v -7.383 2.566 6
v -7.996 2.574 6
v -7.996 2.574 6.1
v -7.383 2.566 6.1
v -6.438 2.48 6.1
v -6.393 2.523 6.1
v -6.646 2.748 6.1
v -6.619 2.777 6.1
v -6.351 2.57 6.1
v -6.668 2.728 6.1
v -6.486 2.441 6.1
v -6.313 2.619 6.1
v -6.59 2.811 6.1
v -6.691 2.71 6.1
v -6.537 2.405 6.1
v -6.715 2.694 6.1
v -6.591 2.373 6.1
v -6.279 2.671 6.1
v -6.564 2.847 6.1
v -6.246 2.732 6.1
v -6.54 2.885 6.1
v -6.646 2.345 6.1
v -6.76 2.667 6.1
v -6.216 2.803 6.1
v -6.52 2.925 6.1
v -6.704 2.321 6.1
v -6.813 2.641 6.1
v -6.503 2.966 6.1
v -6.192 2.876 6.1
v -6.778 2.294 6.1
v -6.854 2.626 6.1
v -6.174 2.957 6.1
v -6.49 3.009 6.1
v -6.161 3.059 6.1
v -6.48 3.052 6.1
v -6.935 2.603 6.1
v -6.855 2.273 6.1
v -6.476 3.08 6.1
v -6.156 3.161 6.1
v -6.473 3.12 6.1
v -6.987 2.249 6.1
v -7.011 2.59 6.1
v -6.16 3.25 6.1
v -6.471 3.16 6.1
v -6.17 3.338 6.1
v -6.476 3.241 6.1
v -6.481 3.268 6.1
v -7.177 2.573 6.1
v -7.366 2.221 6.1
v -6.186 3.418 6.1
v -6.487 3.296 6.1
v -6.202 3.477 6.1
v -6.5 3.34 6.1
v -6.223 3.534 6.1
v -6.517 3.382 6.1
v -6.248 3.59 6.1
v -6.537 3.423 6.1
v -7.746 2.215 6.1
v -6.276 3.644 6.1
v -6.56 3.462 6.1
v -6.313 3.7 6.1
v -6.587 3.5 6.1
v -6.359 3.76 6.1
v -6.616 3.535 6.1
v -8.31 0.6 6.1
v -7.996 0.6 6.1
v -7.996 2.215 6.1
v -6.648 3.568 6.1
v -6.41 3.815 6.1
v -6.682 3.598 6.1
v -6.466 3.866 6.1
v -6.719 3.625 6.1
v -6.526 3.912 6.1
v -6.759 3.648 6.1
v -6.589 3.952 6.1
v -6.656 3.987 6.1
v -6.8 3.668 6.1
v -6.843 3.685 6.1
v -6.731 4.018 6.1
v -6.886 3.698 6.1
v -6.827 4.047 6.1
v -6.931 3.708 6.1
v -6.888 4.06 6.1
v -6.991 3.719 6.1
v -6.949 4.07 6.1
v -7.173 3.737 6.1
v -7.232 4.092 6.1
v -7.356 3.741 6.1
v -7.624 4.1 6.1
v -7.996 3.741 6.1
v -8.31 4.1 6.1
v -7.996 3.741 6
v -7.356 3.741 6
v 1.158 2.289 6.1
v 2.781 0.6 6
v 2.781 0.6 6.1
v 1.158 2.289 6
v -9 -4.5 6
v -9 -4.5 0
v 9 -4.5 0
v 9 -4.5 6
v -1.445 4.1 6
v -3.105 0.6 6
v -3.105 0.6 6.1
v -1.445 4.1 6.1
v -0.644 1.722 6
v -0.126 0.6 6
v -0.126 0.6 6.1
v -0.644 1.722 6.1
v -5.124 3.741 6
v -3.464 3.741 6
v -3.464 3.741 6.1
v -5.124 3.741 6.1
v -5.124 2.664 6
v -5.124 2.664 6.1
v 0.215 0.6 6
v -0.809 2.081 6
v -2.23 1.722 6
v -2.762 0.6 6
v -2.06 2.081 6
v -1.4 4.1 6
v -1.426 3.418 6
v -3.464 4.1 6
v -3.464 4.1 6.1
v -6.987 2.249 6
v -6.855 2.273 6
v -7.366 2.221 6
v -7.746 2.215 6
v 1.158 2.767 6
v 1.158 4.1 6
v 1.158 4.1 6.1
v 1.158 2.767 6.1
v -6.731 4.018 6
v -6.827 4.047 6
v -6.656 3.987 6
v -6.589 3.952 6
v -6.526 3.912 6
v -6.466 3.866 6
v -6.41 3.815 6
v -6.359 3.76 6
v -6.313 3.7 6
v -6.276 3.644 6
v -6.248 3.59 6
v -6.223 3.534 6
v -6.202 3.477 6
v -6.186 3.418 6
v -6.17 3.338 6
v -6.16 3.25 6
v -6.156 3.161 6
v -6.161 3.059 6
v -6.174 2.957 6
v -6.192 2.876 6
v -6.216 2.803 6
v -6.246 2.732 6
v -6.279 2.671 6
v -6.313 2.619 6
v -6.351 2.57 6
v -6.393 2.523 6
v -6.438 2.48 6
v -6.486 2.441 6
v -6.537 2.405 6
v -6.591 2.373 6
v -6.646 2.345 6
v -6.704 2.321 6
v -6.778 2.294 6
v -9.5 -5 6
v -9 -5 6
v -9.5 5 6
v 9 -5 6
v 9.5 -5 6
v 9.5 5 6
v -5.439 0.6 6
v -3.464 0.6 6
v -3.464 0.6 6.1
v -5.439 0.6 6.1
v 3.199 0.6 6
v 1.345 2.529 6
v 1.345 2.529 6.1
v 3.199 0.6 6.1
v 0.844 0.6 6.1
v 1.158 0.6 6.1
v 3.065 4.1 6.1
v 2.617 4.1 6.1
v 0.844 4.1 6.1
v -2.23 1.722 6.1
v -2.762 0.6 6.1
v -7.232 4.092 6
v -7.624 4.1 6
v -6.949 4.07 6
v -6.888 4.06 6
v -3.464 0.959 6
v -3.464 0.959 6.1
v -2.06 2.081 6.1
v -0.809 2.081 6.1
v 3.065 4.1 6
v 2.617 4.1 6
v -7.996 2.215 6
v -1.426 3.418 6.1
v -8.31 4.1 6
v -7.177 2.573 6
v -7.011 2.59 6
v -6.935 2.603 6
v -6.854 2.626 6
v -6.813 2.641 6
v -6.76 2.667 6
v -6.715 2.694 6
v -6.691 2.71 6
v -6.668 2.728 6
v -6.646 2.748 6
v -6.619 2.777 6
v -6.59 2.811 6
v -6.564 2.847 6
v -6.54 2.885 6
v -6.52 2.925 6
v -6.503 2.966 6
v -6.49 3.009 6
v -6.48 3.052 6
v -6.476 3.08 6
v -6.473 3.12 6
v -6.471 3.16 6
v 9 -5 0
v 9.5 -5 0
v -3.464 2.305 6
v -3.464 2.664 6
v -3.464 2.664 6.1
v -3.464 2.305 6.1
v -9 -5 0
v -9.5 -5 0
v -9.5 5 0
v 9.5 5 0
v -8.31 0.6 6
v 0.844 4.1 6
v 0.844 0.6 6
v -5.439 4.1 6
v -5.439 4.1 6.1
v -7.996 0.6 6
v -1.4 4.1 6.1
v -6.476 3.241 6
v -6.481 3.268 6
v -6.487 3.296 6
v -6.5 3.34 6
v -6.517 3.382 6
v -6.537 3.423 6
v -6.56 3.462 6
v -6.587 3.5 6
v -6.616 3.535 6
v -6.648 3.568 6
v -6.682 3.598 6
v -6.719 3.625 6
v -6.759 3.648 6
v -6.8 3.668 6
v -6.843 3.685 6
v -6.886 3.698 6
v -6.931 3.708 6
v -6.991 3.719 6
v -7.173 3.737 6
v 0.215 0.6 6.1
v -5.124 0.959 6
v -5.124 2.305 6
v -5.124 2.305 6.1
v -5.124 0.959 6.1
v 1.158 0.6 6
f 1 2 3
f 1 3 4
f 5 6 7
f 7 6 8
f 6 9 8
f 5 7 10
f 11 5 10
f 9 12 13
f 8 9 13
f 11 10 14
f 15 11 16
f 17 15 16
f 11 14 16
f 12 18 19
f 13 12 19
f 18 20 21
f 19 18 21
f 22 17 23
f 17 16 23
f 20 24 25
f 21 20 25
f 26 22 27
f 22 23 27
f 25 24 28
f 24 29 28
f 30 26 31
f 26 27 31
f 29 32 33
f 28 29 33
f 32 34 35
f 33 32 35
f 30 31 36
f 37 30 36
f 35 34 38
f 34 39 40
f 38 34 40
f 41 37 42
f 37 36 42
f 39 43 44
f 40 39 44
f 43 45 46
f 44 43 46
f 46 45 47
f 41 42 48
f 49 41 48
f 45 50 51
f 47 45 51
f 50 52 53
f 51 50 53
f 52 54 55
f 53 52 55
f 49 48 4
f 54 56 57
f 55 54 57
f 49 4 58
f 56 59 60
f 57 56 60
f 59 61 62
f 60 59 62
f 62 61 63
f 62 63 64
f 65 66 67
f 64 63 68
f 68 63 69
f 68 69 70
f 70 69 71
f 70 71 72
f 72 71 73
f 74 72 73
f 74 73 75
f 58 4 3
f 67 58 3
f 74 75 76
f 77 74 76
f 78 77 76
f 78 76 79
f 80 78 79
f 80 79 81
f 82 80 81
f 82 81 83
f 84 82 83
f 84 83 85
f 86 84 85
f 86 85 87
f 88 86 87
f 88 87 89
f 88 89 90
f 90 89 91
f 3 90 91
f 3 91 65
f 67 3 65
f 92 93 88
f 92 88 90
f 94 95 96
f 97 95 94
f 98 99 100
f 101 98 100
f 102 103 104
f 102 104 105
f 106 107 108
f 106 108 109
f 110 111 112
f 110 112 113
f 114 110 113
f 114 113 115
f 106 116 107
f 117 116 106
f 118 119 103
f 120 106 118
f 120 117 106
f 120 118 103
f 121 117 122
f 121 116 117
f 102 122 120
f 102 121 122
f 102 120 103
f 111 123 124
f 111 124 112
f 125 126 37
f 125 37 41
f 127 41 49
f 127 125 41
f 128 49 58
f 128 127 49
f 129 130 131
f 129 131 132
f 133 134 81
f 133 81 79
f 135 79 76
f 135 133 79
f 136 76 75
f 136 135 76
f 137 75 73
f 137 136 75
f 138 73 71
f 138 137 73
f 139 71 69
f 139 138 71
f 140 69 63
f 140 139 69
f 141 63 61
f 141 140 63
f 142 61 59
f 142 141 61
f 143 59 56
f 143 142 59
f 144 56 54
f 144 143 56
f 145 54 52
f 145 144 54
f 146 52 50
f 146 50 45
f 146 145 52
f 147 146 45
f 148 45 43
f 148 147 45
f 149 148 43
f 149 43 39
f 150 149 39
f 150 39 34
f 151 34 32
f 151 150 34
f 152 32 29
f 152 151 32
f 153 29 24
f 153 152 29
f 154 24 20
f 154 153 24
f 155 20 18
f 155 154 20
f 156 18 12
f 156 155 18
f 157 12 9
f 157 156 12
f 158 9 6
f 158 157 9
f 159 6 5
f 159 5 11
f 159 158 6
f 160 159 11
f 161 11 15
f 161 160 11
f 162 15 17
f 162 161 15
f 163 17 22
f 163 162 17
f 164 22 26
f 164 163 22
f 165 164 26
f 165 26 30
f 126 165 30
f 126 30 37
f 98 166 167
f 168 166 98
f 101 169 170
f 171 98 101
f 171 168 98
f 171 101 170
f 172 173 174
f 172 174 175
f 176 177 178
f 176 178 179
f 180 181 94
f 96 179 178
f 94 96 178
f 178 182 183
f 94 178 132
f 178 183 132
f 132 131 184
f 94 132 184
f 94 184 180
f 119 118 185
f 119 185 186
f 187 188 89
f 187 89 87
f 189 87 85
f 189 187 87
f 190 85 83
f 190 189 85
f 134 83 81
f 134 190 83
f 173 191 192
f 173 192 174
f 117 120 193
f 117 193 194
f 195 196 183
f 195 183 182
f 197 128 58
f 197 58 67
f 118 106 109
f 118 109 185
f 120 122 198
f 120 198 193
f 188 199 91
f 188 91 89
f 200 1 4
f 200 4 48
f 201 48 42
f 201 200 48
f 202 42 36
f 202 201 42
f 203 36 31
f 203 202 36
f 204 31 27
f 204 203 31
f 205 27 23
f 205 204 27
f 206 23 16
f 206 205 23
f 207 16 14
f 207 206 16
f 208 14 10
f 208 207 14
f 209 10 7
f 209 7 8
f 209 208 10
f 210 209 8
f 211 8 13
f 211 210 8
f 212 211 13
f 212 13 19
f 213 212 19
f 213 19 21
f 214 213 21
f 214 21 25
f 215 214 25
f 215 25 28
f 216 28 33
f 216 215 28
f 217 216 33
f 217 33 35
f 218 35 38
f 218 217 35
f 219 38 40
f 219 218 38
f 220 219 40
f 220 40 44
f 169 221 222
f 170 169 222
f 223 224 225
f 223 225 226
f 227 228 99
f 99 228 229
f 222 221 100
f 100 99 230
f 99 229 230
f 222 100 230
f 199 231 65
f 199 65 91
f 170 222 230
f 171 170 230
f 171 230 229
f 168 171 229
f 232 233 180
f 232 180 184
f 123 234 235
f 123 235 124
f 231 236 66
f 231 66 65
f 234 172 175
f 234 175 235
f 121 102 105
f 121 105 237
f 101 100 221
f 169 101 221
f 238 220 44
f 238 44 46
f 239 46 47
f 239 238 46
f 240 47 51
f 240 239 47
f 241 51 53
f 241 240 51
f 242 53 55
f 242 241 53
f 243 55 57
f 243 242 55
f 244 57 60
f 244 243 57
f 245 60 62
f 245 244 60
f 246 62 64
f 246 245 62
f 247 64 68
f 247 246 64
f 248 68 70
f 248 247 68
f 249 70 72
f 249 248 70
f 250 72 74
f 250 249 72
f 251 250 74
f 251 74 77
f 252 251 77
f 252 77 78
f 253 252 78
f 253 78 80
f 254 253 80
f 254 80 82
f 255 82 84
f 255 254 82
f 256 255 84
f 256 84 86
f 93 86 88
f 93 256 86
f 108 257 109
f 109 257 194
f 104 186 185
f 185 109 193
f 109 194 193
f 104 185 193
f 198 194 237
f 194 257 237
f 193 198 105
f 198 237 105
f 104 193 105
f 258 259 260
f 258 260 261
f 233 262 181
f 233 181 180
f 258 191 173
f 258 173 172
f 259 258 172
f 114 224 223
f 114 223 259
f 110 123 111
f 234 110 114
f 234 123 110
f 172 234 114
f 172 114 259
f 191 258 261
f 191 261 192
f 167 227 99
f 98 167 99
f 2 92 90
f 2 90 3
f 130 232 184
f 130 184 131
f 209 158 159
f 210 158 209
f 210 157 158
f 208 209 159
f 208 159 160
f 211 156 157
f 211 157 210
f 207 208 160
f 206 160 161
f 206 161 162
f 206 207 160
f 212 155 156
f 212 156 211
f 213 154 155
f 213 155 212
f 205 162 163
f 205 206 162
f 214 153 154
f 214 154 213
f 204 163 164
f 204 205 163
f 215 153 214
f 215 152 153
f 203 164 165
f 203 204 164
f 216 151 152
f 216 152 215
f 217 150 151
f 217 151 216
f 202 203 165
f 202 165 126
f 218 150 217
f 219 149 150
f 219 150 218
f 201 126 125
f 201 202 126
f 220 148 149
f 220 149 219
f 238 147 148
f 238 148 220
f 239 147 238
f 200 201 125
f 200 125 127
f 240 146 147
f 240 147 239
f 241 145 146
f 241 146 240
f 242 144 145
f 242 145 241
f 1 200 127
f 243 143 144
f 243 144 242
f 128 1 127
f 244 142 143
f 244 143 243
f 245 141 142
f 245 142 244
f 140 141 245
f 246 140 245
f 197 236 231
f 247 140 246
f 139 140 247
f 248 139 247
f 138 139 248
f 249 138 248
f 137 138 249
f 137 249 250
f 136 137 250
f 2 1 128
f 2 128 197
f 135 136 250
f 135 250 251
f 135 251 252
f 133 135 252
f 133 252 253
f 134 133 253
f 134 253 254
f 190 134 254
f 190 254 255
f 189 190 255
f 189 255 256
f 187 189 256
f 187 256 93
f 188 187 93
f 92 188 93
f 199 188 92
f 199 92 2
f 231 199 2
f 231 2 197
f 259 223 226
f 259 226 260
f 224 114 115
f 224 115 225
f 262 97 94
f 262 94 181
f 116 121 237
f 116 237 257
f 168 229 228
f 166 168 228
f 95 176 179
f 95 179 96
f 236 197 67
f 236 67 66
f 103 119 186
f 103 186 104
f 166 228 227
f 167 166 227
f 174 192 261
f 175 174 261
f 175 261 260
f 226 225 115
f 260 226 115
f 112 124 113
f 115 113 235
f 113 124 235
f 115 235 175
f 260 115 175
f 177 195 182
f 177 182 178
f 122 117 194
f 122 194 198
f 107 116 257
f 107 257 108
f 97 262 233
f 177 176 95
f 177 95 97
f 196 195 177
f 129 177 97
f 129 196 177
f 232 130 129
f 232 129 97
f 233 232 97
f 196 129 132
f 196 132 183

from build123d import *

# Parameters (mm, degrees)
EXTRUDE_1_DEPTH   = 6
EXTRUDE_2_DEPTH   = 0.1
EXTRUDE_2_2_DEPTH = 0.1
EXTRUDE_2_3_DEPTH = 0.1
EXTRUDE_2_4_DEPTH = 0.1


with BuildPart() as part:
    # Эскиз1 → Бобышка-Вытянуть1 (new body)
    with BuildSketch(Plane.XY):
        Polygon((-9, -5), (-9, -4.5), (9, -4.5), (9, -5), (9.5, -5), (9.5, 5), (-9.5, 5), (-9.5, -5), align=None)
    extrude(amount=EXTRUDE_1_DEPTH)


with BuildPart() as body_2:
    # Эскиз2 → Бобышка-Вытянуть2 (new body)
    with BuildSketch(Plane.XY.offset(6)):
        with BuildLine():
            Line((-8.310307946, 4.099799348), (-7.623909709, 4.099799348))
            add(Edge.make_bspline(
                [(-7.623909709, 4.099799348), (-7.576698803, 4.099747451), (-7.48624061, 4.099648016), (-7.356525554, 4.09663327), (-7.238715823, 4.092606578), (-7.133065442, 4.087024685), (-7.039249344, 4.080428095), (-6.957692044, 4.071176055), (-6.887752488, 4.06151576), (-6.845846038, 4.051694353), (-6.826734228, 4.047215213)],
                knots=[0, 0, 0, 0, 0.000141628, 0.000271366, 0.00038923, 0.000495248, 0.00058876, 0.000671296, 0.000741499, 0.00080036, 0.00080036, 0.00080036, 0.00080036], degree=3))
            add(Edge.make_bspline(
                [(-6.826734228, 4.047215213), (-6.802540695, 4.040593263), (-6.754723717, 4.027505402), (-6.685822674, 4.001291678), (-6.620268829, 3.970209513), (-6.55783727, 3.934785573), (-6.499295187, 3.893500009), (-6.443769146, 3.848026391), (-6.391749166, 3.797314823), (-6.343527774, 3.741934083), (-6.299242976, 3.682813873), (-6.261113294, 3.619071643), (-6.229186067, 3.55178034), (-6.201802795, 3.480986768), (-6.182094341, 3.406096445), (-6.167247441, 3.327629732), (-6.157823813, 3.245595042), (-6.156921252, 3.189535175), (-6.156461792, 3.160997264)],
                knots=[0, 0, 0, 0, 7.5216e-05, 0.00014866, 0.000220794, 0.000292713, 0.000363707, 0.000435434, 0.000507823, 0.000581364, 0.000655543, 0.000729131, 0.000803767, 0.000878771, 0.000956497, 0.001035702, 0.001118238, 0.001203821, 0.001203821, 0.001203821, 0.001203821], degree=3))
            add(Edge.make_bspline(
                [(-6.156461792, 3.160997264), (-6.156883217, 3.132219488), (-6.157707763, 3.075913824), (-6.167604048, 2.993541035), (-6.18093424, 2.914822645), (-6.201431292, 2.839933195), (-6.228276965, 2.769317424), (-6.259769018, 2.701896192), (-6.297752549, 2.63881652), (-6.341397378, 2.579849403), (-6.389948973, 2.524939491), (-6.443201911, 2.474484696), (-6.500941203, 2.428780358), (-6.562983352, 2.387724014), (-6.6299332, 2.352267735), (-6.700775354, 2.32051043), (-6.77612557, 2.293839369), (-6.828268084, 2.279809308), (-6.8547791, 2.27267595)],
                knots=[0, 0, 0, 0, 8.6284e-05, 0.00016882, 0.000248587, 0.000325638, 0.000401297, 0.000474998, 0.000548586, 0.000621785, 0.0006948, 0.0007682, 0.000841564, 0.000915458, 0.000991056, 0.00106858, 0.00114819, 0.001230532, 0.001230532, 0.001230532, 0.001230532], degree=3))
            add(Edge.make_bspline(
                [(-6.8547791, 2.27267595), (-6.876706434, 2.268012969), (-6.924761461, 2.257793775), (-7.003904184, 2.246385318), (-7.09604957, 2.236647718), (-7.201071849, 2.22934658), (-7.318876754, 2.223096211), (-7.449528012, 2.218128118), (-7.593282089, 2.215398264), (-7.693553333, 2.215257471), (-7.745904901, 2.215183963)],
                knots=[0, 0, 0, 0, 6.7238e-05, 0.000147357, 0.000239727, 0.000345177, 0.000463135, 0.000593636, 0.000737393, 0.000894446, 0.000894446, 0.000894446, 0.000894446], degree=3))
            Line((-7.745904901, 2.215183963), (-7.996205382, 2.215183963))
            Line((-7.996205382, 2.215183963), (-7.996205382, 0.599799348))
            Line((-7.996205382, 0.599799348), (-8.310307946, 0.599799348))
            Line((-8.310307946, 0.599799348), (-8.310307946, 4.099799348))
        make_face()
        with BuildLine():
            Line((-7.996205382, 3.740824989), (-7.996205382, 2.574158322))
            Line((-7.996205382, 2.574158322), (-7.383424933, 2.566445982))
            add(Edge.make_bspline(
                [(-7.383424933, 2.566445982), (-7.353505008, 2.566430519), (-7.295745208, 2.566400667), (-7.212308984, 2.57038589), (-7.134899697, 2.574986423), (-7.063755122, 2.581722346), (-6.998843187, 2.591243604), (-6.940055658, 2.600855342), (-6.887848376, 2.614760704), (-6.826749174, 2.633483773), (-6.758665826, 2.665416389), (-6.684598278, 2.711766279), (-6.621827691, 2.770846987), (-6.567509395, 2.837274819), (-6.524403517, 2.911173948), (-6.492847524, 2.990242885), (-6.474306367, 3.073670734), (-6.471820173, 3.130758873), (-6.470564357, 3.159595021)],
                knots=[0, 0, 0, 0, 8.9746e-05, 0.000173253, 0.000250533, 0.00032239, 0.000387534, 0.00044736, 0.000500926, 0.000549486, 0.000638903, 0.000725641, 0.000810488, 0.000896226, 0.000982324, 0.00106604, 0.001150757, 0.001237226, 0.001237226, 0.001237226, 0.001237226], degree=3))
            add(Edge.make_bspline(
                [(-6.470564357, 3.159595021), (-6.471827003, 3.187733534), (-6.474336988, 3.243669416), (-6.492992851, 3.325648177), (-6.524342165, 3.403883881), (-6.56779876, 3.476856967), (-6.620539889, 3.543045771), (-6.681839233, 3.600542898), (-6.751552494, 3.6467646), (-6.816400725, 3.676597882), (-6.874001911, 3.694813158), (-6.924033871, 3.707557998), (-6.980524545, 3.717733604), (-7.043492325, 3.725973107), (-7.112449159, 3.733026568), (-7.187987474, 3.737812546), (-7.269821117, 3.740614002), (-7.326631688, 3.740752957), (-7.356081183, 3.740824989)],
                knots=[0, 0, 0, 0, 8.4371e-05, 0.000167719, 0.000250783, 0.000336277, 0.000421575, 0.000503926, 0.000587348, 0.000671427, 0.000717102, 0.000768457, 0.000826213, 0.000889178, 0.000958942, 0.001034123, 0.001116202, 0.001204546, 0.001204546, 0.001204546, 0.001204546], degree=3))
            Line((-7.356081183, 3.740824989), (-7.996205382, 3.740824989))
        make_face(mode=Mode.SUBTRACT)
    extrude(amount=EXTRUDE_2_DEPTH)


with BuildPart() as body_3:
    # Эскиз2 → Extrude 2 2 (new body)
    with BuildSketch(Plane.XY.offset(6)):
        Polygon((-5.438513074, 4.099799348), (-3.4641541, 4.099799348), (-3.4641541, 3.740824989), (-5.12441051, 3.740824989), (-5.12441051, 2.663901912), (-3.4641541, 2.663901912), (-3.4641541, 2.304927553), (-5.12441051, 2.304927553), (-5.12441051, 0.958773707), (-3.4641541, 0.958773707), (-3.4641541, 0.599799348), (-5.438513074, 0.599799348), align=None)
    extrude(amount=EXTRUDE_2_2_DEPTH)


with BuildPart() as body_4:
    # Эскиз2 → Extrude 2 3 (new body)
    with BuildSketch(Plane.XY.offset(6)):
        Polygon((-1.400051536, 4.099799348), (0.215333079, 0.599799348), (-0.126113235, 0.599799348), (-0.643541119, 1.72159422), (-2.230179741, 1.72159422), (-2.762331183, 0.599799348), (-3.105179741, 0.599799348), (-1.444923331, 4.099799348), align=None)
        Polygon((-1.425993042, 3.417607841), (-2.059807145, 2.080568578), (-0.809005863, 2.080568578), align=None, mode=Mode.SUBTRACT)
    extrude(amount=EXTRUDE_2_3_DEPTH)


with BuildPart() as body_5:
    # Эскиз2 → Extrude 2 4 (new body)
    with BuildSketch(Plane.XY.offset(6)):
        Polygon((0.843538208, 4.099799348), (1.157640772, 4.099799348), (1.157640772, 2.766966816), (2.616675227, 4.099799348), (3.064692054, 4.099799348), (1.344840291, 2.529286527), (3.199307438, 0.599799348), (2.780737727, 0.599799348), (1.157640772, 2.288801752), (1.157640772, 0.599799348), (0.843538208, 0.599799348), align=None)
    extrude(amount=EXTRUDE_2_4_DEPTH)


solid = Compound([part.part, body_2.part, body_3.part, body_4.part, body_5.part])
